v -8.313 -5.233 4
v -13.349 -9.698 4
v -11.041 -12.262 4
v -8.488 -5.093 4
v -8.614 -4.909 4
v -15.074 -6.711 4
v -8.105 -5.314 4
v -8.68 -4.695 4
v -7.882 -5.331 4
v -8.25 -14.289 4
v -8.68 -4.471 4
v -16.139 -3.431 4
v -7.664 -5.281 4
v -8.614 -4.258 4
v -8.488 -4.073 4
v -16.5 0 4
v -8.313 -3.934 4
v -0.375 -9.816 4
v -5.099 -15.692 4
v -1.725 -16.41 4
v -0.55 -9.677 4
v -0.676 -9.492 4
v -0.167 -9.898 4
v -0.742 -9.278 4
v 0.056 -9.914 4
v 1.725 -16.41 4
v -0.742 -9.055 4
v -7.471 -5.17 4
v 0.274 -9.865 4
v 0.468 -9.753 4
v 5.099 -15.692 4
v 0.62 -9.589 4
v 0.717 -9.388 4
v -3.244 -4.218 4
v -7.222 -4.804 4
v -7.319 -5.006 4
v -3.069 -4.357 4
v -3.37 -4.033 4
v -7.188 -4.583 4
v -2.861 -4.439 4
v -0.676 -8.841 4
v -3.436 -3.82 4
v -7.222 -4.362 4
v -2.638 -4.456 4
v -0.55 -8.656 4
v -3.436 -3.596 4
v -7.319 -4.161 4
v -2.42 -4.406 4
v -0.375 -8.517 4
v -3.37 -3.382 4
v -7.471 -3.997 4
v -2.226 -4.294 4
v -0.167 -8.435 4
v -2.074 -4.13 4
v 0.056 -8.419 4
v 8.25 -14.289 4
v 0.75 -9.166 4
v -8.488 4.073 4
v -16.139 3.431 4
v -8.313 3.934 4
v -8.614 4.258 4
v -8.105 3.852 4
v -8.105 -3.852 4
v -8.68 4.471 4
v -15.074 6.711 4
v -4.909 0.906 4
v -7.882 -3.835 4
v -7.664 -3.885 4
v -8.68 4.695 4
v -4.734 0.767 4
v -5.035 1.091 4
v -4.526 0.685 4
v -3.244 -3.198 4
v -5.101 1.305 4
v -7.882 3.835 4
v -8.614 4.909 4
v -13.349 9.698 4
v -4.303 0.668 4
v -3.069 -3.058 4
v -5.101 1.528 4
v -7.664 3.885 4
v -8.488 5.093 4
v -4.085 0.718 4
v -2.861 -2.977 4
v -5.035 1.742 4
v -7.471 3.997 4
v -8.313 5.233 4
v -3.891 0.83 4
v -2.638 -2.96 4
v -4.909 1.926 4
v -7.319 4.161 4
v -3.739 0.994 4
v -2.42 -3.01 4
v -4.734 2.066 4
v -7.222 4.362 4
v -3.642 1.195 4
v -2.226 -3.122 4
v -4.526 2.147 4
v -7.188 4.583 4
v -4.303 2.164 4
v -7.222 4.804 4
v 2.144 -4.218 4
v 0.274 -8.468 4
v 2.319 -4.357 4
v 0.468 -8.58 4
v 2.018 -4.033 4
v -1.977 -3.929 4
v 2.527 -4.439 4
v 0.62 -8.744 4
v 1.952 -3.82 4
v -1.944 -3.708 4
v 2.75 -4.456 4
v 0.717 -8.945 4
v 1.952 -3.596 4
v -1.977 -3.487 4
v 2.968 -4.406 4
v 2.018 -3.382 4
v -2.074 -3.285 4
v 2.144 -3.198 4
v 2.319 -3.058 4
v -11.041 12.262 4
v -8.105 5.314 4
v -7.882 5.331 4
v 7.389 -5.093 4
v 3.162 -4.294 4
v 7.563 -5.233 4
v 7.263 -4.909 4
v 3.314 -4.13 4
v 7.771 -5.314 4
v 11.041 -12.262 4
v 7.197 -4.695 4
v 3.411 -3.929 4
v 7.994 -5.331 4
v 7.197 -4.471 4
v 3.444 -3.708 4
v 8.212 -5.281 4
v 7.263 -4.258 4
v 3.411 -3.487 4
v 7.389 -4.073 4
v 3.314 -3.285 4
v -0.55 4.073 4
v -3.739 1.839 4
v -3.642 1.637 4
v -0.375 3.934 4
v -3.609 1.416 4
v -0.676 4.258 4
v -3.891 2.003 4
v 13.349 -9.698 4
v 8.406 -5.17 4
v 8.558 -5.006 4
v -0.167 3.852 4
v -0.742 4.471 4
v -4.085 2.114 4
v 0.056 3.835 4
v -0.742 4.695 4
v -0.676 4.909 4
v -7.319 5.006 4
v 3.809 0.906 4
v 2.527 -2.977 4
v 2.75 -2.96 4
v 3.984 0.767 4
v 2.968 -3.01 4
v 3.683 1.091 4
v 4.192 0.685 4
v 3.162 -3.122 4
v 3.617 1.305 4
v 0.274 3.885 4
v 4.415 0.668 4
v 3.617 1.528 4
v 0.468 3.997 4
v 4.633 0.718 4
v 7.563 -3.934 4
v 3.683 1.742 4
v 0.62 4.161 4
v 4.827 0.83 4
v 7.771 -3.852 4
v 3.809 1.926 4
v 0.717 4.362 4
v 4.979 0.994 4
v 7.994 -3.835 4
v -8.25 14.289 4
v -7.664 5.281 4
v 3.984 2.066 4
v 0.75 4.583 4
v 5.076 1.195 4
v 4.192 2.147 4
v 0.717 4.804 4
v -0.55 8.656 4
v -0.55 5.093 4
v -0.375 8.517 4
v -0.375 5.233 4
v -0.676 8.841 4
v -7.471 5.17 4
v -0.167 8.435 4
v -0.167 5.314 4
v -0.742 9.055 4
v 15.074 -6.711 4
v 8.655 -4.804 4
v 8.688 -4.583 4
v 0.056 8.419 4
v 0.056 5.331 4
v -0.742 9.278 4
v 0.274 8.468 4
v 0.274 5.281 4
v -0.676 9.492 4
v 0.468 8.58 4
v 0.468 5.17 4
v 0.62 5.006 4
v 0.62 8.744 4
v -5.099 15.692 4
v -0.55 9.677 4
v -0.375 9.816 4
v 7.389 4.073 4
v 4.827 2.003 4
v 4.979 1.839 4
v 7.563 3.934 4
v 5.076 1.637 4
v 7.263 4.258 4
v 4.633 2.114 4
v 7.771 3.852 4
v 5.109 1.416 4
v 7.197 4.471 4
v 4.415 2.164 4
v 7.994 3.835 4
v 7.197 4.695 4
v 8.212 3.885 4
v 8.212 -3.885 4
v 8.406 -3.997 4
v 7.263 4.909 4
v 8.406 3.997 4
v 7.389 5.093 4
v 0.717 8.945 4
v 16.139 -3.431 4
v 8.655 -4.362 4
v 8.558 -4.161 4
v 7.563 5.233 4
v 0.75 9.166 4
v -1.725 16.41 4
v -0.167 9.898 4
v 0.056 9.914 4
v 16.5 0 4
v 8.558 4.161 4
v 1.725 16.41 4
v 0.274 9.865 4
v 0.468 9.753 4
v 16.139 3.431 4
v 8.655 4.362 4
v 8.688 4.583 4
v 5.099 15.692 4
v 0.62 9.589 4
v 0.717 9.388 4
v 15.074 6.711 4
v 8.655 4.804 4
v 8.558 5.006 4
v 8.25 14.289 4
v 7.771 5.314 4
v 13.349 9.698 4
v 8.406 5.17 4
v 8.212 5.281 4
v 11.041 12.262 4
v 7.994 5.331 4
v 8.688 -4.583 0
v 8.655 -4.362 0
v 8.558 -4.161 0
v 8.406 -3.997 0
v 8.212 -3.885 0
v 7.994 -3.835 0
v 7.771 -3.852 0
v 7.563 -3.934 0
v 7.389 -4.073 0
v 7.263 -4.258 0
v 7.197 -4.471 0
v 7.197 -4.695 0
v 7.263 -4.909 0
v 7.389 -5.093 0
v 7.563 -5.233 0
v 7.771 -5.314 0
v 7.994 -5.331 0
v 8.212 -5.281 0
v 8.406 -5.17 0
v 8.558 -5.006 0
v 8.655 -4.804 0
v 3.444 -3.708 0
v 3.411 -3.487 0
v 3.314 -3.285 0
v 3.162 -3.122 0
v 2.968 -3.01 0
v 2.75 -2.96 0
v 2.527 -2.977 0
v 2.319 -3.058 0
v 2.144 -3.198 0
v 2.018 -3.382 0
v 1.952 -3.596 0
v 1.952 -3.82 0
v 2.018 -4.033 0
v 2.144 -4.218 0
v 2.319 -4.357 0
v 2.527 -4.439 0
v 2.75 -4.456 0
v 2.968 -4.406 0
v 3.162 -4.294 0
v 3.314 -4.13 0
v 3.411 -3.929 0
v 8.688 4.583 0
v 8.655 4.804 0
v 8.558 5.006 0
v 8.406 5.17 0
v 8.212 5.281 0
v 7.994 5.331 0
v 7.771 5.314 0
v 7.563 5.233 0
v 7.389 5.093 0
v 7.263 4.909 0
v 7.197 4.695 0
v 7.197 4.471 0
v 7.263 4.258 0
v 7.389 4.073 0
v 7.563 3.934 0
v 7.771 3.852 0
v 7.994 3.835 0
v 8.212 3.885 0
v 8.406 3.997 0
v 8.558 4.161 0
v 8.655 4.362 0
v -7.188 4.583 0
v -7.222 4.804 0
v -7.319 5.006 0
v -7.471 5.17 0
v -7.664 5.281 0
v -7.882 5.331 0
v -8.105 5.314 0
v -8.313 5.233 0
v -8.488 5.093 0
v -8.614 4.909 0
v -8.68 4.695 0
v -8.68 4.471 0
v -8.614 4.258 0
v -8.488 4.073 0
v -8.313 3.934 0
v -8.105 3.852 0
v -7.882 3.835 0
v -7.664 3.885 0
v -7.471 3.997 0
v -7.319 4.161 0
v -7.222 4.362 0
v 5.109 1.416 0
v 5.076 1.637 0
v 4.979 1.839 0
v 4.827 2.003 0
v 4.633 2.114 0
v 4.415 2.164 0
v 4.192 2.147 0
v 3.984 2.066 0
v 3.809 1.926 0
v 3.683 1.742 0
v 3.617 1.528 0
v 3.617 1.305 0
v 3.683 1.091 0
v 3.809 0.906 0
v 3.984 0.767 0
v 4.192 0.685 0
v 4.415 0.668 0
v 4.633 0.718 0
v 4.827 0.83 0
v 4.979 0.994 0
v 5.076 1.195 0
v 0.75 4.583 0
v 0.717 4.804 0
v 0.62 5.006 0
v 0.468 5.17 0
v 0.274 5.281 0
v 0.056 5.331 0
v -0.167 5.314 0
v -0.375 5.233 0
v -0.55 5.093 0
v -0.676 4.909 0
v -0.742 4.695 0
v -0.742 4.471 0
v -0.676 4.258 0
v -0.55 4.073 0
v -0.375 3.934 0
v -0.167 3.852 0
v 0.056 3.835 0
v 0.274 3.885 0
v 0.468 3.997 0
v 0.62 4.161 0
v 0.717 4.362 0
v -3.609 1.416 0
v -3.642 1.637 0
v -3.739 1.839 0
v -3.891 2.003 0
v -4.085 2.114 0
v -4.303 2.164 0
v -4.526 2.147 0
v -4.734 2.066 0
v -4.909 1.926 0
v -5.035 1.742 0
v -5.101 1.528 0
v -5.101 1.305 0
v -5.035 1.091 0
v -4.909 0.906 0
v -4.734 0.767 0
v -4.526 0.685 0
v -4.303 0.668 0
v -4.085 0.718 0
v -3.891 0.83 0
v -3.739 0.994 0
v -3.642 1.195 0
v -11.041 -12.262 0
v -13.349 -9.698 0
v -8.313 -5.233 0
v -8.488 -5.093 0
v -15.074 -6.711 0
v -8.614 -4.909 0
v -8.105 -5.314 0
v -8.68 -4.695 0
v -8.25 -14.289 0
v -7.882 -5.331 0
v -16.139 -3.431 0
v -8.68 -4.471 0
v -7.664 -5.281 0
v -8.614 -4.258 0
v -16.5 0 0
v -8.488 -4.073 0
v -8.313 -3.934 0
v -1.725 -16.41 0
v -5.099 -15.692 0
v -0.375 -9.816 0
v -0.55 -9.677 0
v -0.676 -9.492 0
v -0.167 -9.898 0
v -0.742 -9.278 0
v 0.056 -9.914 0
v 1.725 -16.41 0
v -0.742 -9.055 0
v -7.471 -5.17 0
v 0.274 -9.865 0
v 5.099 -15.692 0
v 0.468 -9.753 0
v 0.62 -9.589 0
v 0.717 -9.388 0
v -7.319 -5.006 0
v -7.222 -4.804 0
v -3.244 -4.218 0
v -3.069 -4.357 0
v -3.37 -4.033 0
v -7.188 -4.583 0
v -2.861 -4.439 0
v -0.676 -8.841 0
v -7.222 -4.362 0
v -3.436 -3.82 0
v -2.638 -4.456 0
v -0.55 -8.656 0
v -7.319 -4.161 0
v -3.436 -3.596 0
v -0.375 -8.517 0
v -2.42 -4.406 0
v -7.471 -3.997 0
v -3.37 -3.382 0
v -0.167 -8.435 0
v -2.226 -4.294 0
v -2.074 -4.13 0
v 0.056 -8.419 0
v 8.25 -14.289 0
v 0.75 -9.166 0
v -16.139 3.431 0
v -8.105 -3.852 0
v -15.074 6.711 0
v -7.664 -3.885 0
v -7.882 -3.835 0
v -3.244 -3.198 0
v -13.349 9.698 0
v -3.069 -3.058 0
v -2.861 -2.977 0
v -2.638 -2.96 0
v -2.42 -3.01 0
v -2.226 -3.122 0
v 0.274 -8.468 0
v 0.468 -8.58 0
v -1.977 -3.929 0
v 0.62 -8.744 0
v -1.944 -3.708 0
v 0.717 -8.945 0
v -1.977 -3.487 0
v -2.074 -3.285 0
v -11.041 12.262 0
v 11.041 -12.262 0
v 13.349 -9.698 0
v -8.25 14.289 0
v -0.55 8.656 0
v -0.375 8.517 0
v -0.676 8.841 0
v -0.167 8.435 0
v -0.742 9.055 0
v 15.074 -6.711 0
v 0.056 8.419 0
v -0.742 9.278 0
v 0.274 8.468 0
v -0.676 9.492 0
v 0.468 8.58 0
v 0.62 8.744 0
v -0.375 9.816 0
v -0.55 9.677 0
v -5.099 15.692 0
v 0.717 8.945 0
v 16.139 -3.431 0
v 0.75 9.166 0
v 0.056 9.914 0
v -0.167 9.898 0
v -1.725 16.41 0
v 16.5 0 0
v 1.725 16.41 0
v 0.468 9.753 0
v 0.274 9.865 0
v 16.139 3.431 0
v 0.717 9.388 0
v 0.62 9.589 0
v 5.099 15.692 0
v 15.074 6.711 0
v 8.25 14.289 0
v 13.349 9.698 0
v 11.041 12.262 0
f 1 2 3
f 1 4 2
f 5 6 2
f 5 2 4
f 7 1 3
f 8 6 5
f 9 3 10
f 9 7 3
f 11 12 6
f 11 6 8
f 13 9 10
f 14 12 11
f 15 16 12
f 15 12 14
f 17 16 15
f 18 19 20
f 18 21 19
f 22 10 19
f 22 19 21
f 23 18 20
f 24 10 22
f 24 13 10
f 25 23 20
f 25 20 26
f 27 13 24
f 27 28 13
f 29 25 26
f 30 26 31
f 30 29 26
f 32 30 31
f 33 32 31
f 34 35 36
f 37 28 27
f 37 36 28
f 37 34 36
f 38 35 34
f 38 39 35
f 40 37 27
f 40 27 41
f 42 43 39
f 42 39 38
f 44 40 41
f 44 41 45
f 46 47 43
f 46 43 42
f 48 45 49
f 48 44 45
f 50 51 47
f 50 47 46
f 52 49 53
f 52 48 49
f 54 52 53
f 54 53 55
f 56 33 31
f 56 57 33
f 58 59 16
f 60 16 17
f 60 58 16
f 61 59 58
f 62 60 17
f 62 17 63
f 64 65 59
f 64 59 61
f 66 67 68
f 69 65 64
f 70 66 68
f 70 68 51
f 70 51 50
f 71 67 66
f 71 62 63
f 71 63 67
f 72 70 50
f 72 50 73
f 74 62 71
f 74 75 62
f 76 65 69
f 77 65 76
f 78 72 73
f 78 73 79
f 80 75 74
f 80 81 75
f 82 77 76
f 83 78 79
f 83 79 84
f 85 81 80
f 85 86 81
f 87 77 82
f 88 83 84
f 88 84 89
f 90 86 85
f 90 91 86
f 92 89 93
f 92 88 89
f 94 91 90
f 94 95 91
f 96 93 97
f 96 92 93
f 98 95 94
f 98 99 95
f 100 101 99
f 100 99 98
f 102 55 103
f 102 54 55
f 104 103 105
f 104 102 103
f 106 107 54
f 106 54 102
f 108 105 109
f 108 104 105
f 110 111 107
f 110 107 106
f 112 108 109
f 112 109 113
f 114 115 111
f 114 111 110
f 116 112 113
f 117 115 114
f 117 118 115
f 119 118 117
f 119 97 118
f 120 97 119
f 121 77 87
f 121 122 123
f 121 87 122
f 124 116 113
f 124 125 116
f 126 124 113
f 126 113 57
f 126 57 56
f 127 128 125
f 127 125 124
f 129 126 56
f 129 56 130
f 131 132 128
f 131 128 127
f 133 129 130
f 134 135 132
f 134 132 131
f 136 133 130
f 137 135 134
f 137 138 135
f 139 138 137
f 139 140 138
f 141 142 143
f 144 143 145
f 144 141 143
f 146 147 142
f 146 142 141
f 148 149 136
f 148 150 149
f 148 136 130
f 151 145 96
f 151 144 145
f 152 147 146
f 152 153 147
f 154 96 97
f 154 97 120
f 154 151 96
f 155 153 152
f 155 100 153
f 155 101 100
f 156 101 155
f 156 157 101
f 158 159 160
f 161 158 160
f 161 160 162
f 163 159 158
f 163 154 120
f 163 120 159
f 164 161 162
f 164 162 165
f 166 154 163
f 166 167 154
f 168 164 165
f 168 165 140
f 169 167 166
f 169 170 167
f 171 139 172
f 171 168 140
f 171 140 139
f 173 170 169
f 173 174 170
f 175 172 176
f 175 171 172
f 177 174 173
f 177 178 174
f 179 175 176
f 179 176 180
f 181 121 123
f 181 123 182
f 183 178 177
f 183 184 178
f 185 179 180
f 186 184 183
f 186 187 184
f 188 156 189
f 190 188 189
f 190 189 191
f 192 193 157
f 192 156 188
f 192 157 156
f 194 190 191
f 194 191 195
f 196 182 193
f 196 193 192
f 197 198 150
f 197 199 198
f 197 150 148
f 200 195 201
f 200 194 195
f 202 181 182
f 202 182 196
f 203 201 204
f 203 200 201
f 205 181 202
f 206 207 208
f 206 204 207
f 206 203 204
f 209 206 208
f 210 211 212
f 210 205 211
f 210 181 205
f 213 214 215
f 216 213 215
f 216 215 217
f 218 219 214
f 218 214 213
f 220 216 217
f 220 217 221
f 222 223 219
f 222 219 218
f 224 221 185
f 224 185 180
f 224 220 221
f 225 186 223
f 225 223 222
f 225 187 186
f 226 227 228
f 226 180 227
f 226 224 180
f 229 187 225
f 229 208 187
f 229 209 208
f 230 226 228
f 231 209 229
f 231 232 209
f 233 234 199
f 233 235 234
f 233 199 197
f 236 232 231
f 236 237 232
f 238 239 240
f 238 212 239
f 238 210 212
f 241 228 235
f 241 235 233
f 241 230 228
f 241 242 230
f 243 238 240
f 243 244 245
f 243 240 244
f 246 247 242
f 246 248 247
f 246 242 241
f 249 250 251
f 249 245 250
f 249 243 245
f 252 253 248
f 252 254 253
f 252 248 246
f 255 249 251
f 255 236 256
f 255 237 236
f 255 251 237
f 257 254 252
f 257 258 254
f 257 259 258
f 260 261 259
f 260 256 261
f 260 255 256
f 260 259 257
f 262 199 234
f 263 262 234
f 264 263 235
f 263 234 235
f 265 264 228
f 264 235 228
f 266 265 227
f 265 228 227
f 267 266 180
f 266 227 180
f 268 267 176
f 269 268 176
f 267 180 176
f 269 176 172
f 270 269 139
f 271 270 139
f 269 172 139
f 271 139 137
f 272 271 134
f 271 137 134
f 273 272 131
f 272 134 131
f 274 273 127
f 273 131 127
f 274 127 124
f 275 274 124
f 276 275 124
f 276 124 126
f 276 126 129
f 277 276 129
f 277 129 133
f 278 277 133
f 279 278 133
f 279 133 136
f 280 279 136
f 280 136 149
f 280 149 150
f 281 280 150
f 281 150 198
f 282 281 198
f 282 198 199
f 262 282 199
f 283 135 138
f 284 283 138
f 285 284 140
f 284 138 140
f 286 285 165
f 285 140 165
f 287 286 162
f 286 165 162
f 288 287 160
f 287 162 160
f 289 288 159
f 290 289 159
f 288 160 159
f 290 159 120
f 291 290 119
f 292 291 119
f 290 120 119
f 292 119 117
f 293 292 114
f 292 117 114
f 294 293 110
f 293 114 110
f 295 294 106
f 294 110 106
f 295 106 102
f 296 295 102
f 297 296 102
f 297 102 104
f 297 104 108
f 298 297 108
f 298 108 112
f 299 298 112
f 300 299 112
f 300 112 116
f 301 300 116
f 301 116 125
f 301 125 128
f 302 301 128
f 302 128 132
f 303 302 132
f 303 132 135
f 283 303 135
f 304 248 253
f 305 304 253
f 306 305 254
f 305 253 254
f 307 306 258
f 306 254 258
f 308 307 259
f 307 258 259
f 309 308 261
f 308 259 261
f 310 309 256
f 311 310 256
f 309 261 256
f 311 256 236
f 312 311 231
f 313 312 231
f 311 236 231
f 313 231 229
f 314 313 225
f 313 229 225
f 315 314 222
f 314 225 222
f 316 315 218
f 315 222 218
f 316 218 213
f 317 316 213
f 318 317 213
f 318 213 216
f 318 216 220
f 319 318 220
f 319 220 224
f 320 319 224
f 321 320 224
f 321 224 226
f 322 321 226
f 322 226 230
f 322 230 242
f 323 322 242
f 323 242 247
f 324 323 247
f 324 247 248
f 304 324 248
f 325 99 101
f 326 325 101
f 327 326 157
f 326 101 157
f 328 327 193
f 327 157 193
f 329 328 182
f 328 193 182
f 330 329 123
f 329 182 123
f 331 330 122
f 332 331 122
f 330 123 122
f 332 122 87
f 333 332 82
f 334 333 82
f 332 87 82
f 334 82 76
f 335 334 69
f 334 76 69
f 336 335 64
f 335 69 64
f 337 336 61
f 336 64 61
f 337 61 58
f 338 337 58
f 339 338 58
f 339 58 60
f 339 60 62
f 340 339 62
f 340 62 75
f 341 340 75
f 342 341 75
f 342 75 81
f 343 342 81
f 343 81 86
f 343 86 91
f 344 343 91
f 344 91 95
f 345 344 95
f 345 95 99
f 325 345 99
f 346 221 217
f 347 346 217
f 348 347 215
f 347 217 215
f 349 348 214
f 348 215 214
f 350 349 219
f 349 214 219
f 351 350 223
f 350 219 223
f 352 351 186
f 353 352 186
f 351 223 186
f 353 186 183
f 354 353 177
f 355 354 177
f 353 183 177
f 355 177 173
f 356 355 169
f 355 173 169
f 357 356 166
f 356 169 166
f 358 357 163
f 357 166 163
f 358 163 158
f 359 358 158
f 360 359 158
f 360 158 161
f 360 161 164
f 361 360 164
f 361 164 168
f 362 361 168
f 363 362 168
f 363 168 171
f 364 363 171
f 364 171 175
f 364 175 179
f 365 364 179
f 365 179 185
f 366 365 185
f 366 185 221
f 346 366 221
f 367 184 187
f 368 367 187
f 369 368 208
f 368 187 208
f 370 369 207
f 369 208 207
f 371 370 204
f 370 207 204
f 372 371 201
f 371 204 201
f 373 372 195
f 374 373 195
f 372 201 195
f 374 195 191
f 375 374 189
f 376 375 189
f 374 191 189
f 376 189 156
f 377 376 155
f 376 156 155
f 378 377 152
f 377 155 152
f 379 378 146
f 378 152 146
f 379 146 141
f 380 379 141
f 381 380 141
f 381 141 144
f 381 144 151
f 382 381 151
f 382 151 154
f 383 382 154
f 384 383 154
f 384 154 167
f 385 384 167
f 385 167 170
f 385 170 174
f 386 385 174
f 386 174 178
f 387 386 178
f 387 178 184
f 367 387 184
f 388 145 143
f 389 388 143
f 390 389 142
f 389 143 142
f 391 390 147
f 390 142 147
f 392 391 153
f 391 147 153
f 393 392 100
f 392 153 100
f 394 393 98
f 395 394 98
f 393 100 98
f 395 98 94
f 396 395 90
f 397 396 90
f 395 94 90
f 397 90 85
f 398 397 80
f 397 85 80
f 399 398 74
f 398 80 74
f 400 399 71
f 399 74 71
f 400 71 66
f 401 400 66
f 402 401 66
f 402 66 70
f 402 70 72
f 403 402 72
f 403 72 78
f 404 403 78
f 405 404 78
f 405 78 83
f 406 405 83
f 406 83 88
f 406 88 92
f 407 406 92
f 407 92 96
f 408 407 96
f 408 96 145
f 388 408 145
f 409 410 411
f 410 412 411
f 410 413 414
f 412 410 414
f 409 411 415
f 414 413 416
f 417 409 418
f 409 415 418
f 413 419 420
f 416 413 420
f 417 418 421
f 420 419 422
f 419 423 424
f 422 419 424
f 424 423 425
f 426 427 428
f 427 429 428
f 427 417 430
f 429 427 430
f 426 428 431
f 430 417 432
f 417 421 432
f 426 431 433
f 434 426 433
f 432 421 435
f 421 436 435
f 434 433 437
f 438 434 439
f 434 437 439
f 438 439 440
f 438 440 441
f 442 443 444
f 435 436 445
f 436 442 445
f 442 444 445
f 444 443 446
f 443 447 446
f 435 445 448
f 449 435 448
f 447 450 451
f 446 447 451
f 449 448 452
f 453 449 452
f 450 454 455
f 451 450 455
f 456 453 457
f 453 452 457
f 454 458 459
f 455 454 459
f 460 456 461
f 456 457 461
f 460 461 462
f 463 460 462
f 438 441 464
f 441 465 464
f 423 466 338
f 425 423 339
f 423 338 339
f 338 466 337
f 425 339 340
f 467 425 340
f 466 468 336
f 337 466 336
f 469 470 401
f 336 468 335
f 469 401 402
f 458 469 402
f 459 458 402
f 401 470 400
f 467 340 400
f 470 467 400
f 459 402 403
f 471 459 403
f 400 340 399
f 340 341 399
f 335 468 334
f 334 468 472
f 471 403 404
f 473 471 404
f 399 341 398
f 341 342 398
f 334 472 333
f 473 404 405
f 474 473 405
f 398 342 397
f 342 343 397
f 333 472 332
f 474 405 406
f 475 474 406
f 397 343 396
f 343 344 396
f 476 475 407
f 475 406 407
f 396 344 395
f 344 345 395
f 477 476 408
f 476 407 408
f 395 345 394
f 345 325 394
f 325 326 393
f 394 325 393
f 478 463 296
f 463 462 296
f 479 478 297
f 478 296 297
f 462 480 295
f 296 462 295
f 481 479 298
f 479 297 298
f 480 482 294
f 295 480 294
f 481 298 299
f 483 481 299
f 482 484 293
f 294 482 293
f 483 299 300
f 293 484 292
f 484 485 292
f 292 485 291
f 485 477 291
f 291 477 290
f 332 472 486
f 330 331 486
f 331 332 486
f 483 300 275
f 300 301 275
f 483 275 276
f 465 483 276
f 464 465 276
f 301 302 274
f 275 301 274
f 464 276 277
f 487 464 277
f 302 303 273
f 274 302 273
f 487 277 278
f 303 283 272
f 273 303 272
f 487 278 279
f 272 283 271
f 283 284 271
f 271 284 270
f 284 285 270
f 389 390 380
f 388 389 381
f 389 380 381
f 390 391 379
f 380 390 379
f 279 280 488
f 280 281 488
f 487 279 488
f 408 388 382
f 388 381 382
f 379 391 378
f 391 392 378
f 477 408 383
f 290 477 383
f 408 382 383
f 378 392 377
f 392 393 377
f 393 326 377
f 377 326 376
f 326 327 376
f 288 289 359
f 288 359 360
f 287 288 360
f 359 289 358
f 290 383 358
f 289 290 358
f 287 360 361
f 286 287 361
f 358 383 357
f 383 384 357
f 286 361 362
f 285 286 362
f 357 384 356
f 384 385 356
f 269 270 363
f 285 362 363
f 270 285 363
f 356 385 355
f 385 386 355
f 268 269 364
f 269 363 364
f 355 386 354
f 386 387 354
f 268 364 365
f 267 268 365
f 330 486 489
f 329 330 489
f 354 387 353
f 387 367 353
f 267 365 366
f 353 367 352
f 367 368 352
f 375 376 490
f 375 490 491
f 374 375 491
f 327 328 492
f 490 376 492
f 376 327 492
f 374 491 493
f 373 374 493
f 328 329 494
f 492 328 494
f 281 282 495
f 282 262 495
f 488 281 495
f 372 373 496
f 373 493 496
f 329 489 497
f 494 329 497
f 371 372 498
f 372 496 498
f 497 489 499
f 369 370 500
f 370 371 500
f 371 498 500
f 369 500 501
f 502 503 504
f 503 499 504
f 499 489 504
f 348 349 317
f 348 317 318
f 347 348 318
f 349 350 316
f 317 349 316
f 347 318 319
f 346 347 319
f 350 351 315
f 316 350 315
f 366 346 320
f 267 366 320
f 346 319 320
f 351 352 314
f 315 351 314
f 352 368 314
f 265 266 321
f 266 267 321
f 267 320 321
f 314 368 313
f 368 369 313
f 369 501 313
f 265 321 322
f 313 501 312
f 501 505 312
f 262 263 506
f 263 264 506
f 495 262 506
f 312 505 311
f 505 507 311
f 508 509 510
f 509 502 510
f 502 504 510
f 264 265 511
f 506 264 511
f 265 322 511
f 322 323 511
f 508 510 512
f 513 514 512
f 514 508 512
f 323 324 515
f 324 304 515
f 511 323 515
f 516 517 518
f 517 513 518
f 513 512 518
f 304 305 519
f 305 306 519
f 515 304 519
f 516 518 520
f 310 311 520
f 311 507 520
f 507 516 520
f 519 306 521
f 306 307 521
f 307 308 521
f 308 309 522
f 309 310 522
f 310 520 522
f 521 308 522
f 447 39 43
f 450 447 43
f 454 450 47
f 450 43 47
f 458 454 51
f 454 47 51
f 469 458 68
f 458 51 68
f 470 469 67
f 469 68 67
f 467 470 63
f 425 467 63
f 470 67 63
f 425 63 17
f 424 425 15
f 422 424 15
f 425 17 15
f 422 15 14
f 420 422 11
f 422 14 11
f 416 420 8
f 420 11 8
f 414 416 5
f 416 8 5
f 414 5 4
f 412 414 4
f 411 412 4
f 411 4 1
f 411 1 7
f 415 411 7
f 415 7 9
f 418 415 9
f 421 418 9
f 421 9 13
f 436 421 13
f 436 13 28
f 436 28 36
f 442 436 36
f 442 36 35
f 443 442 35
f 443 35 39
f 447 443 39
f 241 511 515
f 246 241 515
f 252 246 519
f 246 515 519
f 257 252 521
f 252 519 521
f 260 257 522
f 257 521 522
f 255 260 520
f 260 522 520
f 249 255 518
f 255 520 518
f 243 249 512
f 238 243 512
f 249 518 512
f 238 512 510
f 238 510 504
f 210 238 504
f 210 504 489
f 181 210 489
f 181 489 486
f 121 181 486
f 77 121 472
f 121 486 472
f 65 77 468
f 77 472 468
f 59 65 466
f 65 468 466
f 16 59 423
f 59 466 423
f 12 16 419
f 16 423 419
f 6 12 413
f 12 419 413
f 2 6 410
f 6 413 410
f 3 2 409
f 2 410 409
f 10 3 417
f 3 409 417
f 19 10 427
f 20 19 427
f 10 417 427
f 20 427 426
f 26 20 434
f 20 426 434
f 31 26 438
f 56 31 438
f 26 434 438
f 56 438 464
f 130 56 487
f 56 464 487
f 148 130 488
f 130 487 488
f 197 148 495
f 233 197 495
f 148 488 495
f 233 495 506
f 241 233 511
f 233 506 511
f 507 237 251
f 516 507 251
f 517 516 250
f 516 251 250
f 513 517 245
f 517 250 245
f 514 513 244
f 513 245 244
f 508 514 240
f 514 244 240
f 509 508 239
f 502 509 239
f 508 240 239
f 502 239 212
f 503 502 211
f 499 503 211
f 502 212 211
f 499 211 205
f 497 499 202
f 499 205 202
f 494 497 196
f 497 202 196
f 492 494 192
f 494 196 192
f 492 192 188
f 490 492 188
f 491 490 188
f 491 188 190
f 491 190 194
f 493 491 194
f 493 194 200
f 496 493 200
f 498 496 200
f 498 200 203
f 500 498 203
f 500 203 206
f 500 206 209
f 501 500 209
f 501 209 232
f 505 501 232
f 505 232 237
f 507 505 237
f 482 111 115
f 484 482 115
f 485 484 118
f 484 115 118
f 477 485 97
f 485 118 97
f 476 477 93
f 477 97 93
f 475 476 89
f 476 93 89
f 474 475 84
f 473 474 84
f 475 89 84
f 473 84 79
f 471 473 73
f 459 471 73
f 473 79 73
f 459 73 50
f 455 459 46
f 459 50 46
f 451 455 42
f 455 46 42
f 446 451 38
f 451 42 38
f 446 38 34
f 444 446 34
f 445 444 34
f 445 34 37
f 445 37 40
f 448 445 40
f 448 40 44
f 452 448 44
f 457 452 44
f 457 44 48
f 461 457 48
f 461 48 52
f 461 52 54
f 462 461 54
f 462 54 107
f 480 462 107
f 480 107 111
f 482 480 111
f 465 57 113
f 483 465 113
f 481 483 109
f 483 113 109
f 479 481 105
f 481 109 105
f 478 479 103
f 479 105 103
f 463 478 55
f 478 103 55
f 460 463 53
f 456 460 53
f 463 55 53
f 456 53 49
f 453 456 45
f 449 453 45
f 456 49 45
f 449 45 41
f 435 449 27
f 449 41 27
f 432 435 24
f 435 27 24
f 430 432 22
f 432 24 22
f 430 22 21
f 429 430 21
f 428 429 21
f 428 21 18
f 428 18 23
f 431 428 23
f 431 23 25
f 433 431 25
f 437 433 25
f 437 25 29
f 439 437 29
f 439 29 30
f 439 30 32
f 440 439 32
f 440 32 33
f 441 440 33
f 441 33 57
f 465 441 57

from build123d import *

# Parameters (mm, degrees)
SKETCH1_R           = 16.5
BOSS_EXTRUDE1_DEPTH = 4
SKETCH2_R           = 0.75
CUT_EXTRUDE1_DEPTH  = 24.674881204


with BuildPart() as part:
    # Sketch1 → Boss-Extrude1 (new body)
    with BuildSketch(Plane.XY):
        Circle(SKETCH1_R)
    extrude(amount=BOSS_EXTRUDE1_DEPTH)

    # Sketch2 → Cut-Extrude1 (cut, through all)
    with BuildSketch(Plane.XY.offset(4)):
        with Locations((0, 9.166448404)):
            Circle(SKETCH2_R)
        with Locations((7.93837718, 4.583224202)):
            Circle(SKETCH2_R)
        with Locations((7.93837718, -4.583224202)):
            Circle(SKETCH2_R)
        with Locations((0, -9.166448404)):
            Circle(SKETCH2_R)
        with Locations((-7.93837718, -4.583224202)):
            Circle(SKETCH2_R)
        with Locations((-7.93837718, 4.583224202)):
            Circle(SKETCH2_R)
        with Locations((0, 4.583224202)):
            Circle(SKETCH2_R)
        with Locations((4.358905243, 1.416294167)):
            Circle(SKETCH2_R)
        with Locations((2.693951594, -3.707906268)):
            Circle(SKETCH2_R)
        with Locations((-2.693951594, -3.707906268)):
            Circle(SKETCH2_R)
        with Locations((-4.358905243, 1.416294167)):
            Circle(SKETCH2_R)
    extrude(amount=-CUT_EXTRUDE1_DEPTH, mode=Mode.SUBTRACT)


solid = part.part
